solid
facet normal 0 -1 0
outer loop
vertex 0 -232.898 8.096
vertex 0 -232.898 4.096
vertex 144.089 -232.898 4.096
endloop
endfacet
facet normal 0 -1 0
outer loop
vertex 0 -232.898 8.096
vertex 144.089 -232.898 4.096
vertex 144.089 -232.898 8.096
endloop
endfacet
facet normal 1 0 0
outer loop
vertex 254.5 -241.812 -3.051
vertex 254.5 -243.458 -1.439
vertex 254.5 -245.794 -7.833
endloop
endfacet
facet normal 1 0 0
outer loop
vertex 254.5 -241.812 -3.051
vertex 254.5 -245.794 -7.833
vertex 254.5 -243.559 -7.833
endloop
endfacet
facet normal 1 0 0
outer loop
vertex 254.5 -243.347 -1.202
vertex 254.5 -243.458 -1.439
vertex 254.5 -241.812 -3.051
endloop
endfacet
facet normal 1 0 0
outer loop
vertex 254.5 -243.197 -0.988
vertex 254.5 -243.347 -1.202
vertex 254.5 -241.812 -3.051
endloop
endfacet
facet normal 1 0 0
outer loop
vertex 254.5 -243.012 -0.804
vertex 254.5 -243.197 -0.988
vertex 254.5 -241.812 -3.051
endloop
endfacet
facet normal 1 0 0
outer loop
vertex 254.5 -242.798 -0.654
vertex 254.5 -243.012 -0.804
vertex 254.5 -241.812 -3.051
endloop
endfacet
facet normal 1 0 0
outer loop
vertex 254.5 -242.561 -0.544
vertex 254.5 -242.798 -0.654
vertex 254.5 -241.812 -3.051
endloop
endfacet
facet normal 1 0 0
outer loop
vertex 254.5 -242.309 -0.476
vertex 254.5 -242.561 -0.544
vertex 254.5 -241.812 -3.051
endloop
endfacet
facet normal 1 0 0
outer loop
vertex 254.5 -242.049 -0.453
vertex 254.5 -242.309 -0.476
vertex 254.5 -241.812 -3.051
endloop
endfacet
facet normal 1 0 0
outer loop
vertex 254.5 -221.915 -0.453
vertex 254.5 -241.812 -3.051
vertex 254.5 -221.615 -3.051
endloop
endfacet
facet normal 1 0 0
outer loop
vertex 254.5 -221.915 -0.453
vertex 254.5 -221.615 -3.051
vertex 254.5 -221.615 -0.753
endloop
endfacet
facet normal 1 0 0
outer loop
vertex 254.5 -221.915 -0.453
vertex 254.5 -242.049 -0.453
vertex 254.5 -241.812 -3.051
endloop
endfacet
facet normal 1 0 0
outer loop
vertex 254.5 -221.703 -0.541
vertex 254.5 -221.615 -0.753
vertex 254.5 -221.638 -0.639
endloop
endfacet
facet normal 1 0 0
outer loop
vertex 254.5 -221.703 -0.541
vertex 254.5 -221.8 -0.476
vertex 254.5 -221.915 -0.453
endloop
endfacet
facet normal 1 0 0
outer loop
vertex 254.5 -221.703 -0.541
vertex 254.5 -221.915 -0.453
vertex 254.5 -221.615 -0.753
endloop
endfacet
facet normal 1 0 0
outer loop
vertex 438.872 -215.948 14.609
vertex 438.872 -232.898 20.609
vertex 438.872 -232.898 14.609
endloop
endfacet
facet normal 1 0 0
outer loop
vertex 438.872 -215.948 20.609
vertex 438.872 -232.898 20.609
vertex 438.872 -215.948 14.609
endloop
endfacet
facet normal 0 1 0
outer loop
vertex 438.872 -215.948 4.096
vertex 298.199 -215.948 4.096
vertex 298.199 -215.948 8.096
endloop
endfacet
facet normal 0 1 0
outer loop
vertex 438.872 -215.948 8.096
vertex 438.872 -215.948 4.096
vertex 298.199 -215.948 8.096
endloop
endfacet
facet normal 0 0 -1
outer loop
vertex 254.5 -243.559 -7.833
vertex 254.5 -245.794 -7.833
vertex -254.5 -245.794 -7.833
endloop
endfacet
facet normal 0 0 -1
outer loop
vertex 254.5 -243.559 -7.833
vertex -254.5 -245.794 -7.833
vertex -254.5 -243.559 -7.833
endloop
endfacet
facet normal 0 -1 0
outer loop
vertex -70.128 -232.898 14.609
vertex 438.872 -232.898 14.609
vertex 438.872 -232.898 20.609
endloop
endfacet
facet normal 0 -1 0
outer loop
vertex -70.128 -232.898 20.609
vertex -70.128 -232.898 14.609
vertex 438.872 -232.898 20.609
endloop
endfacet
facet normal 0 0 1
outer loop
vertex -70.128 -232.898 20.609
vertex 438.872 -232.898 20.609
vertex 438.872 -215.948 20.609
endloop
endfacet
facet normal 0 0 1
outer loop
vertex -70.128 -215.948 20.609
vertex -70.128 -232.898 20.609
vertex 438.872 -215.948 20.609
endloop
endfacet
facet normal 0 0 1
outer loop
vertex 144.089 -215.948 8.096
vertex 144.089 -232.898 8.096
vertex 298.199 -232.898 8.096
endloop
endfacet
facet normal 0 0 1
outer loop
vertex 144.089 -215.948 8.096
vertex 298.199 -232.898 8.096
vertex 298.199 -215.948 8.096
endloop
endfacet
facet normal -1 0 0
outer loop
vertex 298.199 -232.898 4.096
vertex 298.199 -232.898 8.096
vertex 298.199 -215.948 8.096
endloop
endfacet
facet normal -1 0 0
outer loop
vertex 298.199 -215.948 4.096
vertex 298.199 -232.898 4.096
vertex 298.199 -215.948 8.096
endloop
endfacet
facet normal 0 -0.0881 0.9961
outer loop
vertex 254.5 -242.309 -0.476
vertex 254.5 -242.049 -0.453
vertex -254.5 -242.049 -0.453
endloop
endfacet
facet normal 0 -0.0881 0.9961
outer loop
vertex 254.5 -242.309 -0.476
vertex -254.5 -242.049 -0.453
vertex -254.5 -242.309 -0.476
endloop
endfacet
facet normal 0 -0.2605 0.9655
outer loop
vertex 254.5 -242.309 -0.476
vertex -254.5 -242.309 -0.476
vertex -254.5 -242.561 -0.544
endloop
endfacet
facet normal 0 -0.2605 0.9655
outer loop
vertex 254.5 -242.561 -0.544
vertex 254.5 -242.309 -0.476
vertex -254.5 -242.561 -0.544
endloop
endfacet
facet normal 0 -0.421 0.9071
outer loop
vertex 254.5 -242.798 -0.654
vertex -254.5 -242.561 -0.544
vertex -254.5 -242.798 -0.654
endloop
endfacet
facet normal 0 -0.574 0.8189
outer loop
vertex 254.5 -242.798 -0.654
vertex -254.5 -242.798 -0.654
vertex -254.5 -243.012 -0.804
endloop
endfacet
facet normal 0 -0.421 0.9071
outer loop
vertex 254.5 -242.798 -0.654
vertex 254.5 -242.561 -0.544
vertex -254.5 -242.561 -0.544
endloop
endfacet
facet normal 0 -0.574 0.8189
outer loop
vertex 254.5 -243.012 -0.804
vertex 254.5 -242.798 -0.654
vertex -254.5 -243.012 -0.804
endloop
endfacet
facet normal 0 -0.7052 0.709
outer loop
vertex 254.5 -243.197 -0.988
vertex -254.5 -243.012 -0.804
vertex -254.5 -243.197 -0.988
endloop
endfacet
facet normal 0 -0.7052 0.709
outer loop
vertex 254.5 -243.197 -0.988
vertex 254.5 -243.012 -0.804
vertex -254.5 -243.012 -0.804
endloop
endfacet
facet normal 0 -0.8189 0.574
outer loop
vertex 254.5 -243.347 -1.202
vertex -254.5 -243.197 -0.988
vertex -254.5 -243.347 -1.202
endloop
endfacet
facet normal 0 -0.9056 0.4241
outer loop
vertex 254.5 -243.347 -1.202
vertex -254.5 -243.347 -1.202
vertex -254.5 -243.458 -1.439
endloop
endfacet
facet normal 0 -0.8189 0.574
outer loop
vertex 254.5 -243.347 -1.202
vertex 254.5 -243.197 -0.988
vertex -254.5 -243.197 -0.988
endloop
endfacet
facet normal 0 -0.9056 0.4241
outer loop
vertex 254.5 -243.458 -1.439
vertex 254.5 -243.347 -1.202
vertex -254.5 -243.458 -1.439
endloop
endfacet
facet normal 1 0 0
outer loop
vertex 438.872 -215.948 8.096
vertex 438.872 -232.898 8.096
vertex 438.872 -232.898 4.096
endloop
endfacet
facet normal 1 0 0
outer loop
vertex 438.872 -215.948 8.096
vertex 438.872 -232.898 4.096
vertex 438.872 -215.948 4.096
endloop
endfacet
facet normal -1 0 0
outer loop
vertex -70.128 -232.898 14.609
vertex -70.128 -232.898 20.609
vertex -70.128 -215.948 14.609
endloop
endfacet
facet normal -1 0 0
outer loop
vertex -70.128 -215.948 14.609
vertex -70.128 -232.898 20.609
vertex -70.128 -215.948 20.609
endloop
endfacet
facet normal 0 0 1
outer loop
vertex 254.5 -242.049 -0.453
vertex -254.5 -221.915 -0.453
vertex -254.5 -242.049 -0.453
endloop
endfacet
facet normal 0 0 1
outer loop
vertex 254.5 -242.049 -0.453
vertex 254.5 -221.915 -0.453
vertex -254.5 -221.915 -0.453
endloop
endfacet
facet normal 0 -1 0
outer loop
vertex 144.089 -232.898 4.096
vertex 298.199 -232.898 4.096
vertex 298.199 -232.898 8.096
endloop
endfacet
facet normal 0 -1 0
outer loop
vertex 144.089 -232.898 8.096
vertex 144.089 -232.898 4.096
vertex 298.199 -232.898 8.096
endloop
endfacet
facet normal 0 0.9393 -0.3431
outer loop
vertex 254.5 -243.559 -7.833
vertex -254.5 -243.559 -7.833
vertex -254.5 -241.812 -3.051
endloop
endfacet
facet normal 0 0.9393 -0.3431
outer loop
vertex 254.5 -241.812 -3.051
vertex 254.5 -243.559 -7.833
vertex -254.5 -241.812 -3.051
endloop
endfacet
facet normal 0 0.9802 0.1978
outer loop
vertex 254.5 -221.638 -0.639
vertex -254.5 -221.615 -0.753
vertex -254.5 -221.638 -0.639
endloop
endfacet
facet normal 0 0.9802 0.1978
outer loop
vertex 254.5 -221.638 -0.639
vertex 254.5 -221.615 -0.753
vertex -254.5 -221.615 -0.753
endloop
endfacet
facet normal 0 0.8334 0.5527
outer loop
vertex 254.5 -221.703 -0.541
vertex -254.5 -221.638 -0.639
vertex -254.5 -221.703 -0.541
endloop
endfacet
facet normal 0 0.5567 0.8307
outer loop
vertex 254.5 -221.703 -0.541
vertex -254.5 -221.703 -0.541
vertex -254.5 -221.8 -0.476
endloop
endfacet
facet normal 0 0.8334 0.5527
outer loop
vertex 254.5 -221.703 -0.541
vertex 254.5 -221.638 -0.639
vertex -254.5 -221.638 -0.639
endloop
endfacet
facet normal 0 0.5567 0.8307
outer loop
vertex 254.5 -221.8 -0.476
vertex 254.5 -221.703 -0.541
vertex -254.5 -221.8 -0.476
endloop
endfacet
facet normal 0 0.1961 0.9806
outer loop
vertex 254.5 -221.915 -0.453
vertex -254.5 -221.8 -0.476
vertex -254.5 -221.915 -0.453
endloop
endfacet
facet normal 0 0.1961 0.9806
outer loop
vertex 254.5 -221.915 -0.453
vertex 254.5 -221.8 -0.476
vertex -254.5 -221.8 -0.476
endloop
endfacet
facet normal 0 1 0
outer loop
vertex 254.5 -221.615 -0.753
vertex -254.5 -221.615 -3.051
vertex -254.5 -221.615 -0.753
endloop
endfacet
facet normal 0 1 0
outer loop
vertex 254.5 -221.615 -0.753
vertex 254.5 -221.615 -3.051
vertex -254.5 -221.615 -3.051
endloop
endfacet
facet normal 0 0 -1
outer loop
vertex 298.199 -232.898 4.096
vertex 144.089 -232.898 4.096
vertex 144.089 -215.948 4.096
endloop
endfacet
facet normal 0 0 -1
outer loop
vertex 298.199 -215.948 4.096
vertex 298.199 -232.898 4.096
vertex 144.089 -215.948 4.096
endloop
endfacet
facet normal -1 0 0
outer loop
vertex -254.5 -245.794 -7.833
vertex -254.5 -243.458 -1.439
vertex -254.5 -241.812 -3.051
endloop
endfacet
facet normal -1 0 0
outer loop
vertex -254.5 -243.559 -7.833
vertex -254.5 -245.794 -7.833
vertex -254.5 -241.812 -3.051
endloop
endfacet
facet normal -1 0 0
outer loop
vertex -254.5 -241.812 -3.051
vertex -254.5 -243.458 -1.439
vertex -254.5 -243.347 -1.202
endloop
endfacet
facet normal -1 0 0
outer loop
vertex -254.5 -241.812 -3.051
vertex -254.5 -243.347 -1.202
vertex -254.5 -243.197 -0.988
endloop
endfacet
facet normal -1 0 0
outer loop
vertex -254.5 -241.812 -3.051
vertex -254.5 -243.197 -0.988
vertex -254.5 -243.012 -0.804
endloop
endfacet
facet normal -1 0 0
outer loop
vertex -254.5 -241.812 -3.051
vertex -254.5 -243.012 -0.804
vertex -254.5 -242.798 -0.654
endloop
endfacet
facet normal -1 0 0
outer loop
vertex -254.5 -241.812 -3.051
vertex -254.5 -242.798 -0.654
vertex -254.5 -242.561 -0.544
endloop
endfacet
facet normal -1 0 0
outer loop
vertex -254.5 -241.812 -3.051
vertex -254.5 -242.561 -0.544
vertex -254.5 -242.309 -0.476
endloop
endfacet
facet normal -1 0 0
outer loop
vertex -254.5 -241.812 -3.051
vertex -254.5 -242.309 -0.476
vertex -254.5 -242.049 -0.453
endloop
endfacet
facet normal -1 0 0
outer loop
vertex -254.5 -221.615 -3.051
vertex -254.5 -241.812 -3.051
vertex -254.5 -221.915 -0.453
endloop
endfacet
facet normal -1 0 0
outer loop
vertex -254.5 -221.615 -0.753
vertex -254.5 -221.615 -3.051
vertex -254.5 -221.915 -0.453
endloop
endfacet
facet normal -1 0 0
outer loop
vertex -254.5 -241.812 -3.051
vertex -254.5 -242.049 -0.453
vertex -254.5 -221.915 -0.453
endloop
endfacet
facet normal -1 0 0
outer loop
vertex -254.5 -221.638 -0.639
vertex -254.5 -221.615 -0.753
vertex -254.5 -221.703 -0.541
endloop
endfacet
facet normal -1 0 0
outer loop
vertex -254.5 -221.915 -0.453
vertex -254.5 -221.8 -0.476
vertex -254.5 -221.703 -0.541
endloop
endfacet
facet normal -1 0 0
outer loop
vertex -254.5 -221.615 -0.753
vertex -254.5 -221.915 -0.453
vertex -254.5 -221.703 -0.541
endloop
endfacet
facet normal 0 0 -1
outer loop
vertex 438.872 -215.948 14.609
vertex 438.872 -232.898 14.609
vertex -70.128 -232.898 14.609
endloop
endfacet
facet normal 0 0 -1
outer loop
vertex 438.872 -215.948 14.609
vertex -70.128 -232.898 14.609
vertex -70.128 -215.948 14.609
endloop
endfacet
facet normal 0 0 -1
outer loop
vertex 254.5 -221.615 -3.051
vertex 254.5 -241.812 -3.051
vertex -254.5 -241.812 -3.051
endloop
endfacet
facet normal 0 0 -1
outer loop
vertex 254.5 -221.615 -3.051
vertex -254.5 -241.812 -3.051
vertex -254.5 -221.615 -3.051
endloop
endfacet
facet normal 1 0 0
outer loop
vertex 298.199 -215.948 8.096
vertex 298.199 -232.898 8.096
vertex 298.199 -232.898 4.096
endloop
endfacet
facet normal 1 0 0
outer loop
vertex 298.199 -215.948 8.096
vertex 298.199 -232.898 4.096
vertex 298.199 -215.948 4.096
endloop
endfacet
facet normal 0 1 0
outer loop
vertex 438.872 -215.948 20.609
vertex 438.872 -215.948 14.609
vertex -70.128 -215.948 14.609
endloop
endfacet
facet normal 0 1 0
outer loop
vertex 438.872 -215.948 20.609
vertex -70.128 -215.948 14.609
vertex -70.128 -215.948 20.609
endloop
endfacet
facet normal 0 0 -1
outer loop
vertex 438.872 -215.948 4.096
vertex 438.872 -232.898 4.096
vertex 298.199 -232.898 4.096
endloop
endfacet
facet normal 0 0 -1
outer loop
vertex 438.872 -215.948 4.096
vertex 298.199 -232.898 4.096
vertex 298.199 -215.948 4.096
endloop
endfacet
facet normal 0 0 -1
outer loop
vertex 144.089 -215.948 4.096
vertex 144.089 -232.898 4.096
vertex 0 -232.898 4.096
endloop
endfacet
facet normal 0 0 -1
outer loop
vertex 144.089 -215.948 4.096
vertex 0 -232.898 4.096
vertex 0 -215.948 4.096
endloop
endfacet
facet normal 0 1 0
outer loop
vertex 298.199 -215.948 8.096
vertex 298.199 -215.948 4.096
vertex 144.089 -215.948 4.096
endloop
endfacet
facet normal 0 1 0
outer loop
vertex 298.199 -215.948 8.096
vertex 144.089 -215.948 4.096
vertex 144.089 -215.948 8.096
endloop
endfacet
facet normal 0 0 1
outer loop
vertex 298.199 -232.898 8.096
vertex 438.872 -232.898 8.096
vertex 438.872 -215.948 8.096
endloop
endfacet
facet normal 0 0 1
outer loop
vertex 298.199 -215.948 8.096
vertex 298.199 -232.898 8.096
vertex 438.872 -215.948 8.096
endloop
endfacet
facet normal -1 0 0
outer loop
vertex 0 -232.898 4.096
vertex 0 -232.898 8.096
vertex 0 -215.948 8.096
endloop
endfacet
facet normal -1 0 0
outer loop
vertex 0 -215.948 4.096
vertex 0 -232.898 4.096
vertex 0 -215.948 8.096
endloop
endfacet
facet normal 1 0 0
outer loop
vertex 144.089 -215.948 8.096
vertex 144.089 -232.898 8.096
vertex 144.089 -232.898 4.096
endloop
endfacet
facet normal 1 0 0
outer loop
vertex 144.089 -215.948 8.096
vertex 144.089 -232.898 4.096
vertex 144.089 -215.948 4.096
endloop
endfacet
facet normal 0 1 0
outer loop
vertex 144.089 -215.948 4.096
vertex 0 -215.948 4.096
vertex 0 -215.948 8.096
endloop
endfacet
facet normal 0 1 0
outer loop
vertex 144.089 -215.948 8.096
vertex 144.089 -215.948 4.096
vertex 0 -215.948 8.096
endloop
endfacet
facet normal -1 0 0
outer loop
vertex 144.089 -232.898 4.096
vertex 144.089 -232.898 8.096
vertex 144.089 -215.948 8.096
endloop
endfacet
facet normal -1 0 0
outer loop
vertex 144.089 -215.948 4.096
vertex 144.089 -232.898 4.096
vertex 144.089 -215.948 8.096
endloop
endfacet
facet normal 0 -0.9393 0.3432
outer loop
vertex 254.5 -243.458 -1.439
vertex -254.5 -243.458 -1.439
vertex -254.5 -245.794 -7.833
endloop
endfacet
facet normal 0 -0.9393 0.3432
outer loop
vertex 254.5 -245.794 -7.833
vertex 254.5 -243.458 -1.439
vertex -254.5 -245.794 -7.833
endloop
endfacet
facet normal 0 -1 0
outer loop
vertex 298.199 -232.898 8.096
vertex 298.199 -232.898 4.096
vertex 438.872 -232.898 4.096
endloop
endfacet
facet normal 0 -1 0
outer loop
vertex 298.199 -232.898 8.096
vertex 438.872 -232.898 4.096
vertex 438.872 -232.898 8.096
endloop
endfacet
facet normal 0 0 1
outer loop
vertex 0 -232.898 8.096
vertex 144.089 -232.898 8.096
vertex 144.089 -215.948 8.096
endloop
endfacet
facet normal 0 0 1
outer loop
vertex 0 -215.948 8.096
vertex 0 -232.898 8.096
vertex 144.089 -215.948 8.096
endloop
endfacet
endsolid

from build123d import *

# Parameters (mm, degrees)
F1_DEPTH = 254.5
F2_W     = 16.95
F2_H     = 4
F3_DEPTH = 144.089
F4_DEPTH = 154.11
F5_DEPTH = 140.673
F6_W     = 16.95
F6_H     = 6
F7_DEPTH = 509


with BuildPart() as f1:
    # F0 (on Right) → F1 (new body, symmetric)
    with BuildSketch(Plane.YZ):
        with BuildLine():
            Line((-221.9147454425, -0.4533372252), (-242.0487991016, -0.4533372252))
            ThreePointArc((-242.0487991016, -0.4533372252), (-242.9084130084, -0.7240838212), (-243.4577101963, -1.4385853169))
            Line((-243.4577101963, -1.4385853169), (-245.7940611276, -7.8333372252))
            Line((-245.7940611276, -7.8333372252), (-243.5593566017, -7.8333372252))
            Line((-243.5593566017, -7.8333372252), (-241.8122317228, -3.0513372252))
            Line((-241.8122317228, -3.0513372252), (-221.6147454425, -3.0513372252))
            Line((-221.6147454425, -3.0513372252), (-221.6147454425, -0.7533372252))
            ThreePointArc((-221.6147454425, -0.7533372252), (-221.7026134081, -0.5412051909), (-221.9147454425, -0.4533372252))
        make_face()
    extrude(amount=F1_DEPTH, both=True)


with BuildPart() as f3:
    # F2 (on Right) → F3 (new body)
    with BuildSketch(Plane.YZ):
        with Locations((-224.4229500501, 6.0959723778)):
            Rectangle(F2_W, F2_H)
    extrude(amount=F3_DEPTH)


with BuildPart() as f4:
    # F4 (new): a face of the model
    f4_faces = [f3.part.faces().sort_by_distance(p)[0] for p in [
        (144.089, -224.4229500501, 6.0959723778),
    ]]
    extrude(f4_faces, amount=F4_DEPTH)


with BuildPart() as f5:
    # F5 (new): a face of the model
    f5_faces = [f4.part.faces().sort_by_distance(p)[0] for p in [
        (298.199, -224.4229500501, 6.0959723778),
    ]]
    extrude(f5_faces, amount=F5_DEPTH)


with BuildPart() as f7:
    # F6 (on face) → F7 (new body)
    with BuildSketch(Plane.YZ.offset(438.872)):
        with Locations((-224.4229500501, 17.6090779454)):
            Rectangle(F6_W, F6_H)
    extrude(amount=-F7_DEPTH)


solid = Compound([f1.part, f3.part, f4.part, f5.part, f7.part])
